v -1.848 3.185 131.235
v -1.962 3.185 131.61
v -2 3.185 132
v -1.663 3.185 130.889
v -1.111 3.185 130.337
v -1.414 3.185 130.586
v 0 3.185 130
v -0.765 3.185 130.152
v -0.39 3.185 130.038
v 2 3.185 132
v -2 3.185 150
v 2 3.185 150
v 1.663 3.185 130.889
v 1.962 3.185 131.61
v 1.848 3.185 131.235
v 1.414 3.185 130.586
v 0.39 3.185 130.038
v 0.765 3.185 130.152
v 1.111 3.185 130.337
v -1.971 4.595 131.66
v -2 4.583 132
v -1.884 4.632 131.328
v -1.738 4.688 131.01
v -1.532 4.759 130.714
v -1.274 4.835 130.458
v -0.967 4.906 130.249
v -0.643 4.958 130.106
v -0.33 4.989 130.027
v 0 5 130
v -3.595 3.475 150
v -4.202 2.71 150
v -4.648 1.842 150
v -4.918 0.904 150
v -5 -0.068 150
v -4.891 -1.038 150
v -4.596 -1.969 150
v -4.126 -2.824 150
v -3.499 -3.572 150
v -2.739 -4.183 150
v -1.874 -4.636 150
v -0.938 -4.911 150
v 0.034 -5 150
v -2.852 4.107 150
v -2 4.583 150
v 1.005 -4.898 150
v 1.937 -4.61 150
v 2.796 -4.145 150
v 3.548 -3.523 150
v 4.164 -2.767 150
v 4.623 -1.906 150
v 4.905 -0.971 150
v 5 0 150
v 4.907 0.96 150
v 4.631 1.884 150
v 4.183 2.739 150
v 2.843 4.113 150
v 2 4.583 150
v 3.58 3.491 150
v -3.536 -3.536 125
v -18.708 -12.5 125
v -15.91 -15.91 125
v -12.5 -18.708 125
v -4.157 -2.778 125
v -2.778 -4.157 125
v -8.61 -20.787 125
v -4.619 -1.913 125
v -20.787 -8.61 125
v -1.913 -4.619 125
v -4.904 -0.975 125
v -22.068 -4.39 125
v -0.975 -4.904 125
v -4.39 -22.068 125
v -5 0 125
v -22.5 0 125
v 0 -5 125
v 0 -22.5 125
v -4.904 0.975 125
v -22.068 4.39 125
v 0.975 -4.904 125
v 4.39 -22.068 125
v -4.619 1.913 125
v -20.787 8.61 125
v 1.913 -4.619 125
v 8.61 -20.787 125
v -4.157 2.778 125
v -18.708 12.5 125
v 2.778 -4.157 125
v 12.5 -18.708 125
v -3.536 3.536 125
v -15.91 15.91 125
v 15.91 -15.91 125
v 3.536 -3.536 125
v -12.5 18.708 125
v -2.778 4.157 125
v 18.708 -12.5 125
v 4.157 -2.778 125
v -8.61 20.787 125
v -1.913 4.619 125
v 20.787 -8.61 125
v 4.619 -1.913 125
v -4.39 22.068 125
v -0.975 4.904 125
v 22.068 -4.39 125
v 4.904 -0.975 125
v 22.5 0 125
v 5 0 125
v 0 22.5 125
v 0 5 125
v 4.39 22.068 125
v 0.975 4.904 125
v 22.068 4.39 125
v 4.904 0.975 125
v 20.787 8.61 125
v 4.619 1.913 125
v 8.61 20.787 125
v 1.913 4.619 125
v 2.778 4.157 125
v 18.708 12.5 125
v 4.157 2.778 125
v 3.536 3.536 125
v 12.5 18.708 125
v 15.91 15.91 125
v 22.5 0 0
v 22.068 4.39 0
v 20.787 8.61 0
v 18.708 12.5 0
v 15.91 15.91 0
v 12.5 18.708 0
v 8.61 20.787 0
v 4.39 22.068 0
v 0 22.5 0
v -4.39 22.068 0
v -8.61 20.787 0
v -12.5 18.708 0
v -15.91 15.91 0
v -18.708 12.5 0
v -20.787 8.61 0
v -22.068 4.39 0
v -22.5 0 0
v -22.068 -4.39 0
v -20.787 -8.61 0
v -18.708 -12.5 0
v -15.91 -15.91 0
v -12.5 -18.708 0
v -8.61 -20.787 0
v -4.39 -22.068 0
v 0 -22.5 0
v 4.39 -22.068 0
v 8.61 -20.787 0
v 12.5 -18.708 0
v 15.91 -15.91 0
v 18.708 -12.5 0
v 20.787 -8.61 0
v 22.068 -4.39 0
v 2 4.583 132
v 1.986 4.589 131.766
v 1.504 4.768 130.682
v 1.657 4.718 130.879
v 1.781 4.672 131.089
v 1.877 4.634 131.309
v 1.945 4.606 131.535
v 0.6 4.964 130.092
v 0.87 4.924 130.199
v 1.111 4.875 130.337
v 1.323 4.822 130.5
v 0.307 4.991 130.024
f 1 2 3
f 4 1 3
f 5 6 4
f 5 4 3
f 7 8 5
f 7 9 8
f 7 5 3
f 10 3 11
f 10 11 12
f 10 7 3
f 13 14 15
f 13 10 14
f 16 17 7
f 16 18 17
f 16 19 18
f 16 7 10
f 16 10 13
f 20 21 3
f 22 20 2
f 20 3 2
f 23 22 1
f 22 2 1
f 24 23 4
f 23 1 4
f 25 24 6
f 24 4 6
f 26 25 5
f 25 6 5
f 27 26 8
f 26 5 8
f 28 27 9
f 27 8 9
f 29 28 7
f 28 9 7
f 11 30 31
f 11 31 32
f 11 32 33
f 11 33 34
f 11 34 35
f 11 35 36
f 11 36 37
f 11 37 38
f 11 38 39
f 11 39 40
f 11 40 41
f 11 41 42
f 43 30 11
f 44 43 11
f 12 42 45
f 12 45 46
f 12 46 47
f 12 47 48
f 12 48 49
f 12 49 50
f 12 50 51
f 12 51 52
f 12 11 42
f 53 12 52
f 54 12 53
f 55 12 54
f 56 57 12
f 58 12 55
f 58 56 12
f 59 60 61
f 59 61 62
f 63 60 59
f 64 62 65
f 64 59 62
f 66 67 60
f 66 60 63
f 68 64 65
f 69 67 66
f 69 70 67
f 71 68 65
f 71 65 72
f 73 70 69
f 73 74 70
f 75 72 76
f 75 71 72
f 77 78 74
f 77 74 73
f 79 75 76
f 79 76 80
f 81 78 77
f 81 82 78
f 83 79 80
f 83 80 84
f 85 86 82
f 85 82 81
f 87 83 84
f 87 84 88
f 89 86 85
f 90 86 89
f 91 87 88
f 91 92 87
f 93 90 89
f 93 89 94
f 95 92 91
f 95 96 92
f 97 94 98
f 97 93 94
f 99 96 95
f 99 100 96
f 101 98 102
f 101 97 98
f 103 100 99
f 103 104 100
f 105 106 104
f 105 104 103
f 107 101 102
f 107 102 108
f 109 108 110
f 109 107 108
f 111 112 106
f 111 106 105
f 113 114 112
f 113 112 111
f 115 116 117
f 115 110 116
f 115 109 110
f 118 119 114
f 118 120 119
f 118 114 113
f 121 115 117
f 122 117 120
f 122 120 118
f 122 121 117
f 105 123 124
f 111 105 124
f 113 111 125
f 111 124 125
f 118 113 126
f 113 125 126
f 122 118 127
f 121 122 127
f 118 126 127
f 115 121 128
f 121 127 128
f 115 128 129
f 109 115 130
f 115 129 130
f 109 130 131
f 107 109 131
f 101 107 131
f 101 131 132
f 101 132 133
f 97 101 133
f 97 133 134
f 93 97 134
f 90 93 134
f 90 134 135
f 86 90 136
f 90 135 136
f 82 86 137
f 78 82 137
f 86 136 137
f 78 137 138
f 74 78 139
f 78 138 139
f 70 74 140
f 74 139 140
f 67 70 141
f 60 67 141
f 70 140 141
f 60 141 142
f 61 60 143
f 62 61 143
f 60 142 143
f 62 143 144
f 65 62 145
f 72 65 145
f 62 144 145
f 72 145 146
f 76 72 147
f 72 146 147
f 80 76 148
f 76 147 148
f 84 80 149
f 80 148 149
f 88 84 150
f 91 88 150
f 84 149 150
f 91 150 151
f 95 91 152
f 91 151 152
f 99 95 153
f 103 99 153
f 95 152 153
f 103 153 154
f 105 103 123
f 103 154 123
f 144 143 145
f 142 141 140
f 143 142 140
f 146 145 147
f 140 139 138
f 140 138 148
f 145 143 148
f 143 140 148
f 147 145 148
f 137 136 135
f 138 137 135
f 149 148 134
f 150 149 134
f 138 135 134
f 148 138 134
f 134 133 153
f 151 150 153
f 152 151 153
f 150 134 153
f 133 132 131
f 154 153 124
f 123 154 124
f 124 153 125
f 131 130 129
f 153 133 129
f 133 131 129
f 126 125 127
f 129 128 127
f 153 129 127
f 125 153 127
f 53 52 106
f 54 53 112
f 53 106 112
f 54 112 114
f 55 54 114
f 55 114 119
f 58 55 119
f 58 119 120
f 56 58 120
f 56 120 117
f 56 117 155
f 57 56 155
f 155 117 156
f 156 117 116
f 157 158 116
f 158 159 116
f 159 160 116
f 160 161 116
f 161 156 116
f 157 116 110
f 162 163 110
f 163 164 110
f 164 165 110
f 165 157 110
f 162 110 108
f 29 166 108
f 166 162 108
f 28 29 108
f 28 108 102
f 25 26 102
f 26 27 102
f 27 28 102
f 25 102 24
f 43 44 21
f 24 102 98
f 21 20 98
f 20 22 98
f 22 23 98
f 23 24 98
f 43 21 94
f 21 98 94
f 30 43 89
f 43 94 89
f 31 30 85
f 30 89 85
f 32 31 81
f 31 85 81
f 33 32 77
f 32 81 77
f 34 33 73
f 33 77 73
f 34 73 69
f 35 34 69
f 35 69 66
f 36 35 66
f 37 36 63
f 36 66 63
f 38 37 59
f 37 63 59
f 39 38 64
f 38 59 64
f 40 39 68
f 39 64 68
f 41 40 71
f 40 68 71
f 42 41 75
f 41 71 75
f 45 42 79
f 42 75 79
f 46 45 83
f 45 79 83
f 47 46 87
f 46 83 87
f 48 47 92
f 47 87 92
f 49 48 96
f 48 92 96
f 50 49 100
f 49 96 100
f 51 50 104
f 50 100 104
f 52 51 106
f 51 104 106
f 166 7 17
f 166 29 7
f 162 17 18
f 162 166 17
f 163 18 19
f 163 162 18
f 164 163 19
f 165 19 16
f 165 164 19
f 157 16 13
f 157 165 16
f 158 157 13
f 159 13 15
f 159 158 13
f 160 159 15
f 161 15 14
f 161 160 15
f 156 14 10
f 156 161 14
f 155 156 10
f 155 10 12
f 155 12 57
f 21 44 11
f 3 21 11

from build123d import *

# Parameters (mm, degrees)
SKETCH1_R           = 22.5
BOSS_EXTRUDE1_DEPTH = 125
SKETCH3_R           = 5
BOSS_EXTRUDE2_DEPTH = 25
CUT_EXTRUDE1_START  = -20
CUT_EXTRUDE1_DEPTH  = 20
FILLET1_R           = 2


with BuildPart() as part:
    # Sketch1 → Boss-Extrude1 (new body)
    with BuildSketch(Plane.XY):
        Circle(SKETCH1_R)
    extrude(amount=BOSS_EXTRUDE1_DEPTH)

    # Sketch3 → Boss-Extrude2 (add)
    with BuildSketch(Plane.XY.offset(125)):
        Circle(SKETCH3_R)
    extrude(amount=BOSS_EXTRUDE2_DEPTH)

    # Sketch4 → Cut-Extrude1 (cut)
    with BuildSketch(Plane.XY.offset(150).offset(CUT_EXTRUDE1_START)):
        with BuildLine():
            Line((-2, 3.184954178), (2, 3.184954178))
            Line((2, 3.184954178), (2, 4.582575695))
            ThreePointArc((2, 4.582575695), (0, 5), (-2, 4.582575695))
            Line((-2, 4.582575695), (-2, 3.184954178))
        make_face()
    extrude(amount=CUT_EXTRUDE1_DEPTH, mode=Mode.SUBTRACT)

    # Fillet1
    fillet1_edges = [part.edges().sort_by_distance(p)[0] for p in [
        (-2, 3.883764937, 130),
        (2, 3.883764937, 130),
    ]]
    fillet(fillet1_edges, radius=FILLET1_R - 0.0001)  # a hair under: the kernel refuses the full size


solid = part.part
